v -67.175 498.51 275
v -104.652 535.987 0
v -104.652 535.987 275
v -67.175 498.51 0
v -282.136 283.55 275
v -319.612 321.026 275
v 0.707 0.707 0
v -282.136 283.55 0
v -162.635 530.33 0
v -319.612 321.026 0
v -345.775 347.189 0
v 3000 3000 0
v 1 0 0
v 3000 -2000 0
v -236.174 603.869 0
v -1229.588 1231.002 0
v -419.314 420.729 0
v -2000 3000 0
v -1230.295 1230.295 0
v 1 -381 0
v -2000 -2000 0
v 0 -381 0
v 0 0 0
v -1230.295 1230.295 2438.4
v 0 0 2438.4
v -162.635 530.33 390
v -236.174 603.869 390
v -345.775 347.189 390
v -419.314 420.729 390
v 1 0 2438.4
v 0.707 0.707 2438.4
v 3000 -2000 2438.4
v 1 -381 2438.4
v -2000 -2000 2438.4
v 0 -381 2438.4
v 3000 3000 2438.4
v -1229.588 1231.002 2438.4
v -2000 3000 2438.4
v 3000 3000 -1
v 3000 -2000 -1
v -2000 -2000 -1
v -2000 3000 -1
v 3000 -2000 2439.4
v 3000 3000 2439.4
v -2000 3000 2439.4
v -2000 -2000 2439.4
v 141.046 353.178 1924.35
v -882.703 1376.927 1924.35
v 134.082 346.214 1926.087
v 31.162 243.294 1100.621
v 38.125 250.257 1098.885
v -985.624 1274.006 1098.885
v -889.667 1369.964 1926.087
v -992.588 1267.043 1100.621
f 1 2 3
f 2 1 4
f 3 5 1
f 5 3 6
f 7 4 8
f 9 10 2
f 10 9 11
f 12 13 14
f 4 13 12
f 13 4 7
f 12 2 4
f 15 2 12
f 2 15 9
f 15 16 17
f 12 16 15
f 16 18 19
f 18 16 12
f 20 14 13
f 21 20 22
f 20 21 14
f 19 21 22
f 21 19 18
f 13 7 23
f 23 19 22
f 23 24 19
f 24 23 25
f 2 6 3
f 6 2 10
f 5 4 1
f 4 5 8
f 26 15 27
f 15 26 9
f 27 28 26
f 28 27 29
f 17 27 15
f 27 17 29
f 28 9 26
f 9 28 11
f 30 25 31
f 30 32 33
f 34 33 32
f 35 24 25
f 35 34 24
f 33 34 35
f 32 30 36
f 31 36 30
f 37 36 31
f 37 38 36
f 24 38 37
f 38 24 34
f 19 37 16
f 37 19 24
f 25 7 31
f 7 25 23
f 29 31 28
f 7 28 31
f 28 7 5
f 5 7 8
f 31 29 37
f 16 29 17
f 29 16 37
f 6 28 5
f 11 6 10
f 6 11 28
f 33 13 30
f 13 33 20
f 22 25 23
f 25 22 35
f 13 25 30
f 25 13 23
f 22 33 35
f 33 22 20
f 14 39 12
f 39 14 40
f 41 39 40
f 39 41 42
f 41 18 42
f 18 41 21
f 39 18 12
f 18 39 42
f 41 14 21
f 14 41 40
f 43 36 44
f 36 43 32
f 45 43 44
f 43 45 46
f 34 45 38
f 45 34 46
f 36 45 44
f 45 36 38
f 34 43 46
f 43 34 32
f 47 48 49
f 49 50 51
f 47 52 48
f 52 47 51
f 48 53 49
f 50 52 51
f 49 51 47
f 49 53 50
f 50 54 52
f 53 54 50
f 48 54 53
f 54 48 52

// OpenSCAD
// 1'3"  15"
// 5'8.5"  68.5"

// 8'  96"

 mms = 25.4;

wallH = 96*mms;
wallW = 68.5*mms;
sWallW = 15*mms;

rotate([0,0,45]) translate([0,400,0]) {
ps4();
translate([0,90,0]) ps5();
}

color("#ededda") {
rotate([0,0,45]) cube([1,wallW,wallH]);
translate([0,-sWallW,0]) cube([1,sWallW,wallH]);
}

color("#873e23") {
    translate([-2000,-2000,-1]) cube([5000,5000,1]);
}

color("#588723") {
    translate([-2000,-2000,wallH]) cube([5000,5000,1]);
}


// 57 33 19

color("black") {
    rotate([0,0,45]) rotate([0,10,0]) translate([0,150,wallH-33*mms-19*mms]) cube([10,57*mms,33*mms]);
}

module ps5() {
  //PlayStation 5 has a height of 15.4” (390 mm), width of 4.1” (104 mm), depth of 10.2" (260 mm)
  color("white") cube([260,104,390]);
}


module ps4() {
  //The PlayStation 4 has a height of 2.09” (53 mm), depth of 12” (305 mm), width of 10.8” (275 mm)
  color("black") cube([305,53,275]);
}
